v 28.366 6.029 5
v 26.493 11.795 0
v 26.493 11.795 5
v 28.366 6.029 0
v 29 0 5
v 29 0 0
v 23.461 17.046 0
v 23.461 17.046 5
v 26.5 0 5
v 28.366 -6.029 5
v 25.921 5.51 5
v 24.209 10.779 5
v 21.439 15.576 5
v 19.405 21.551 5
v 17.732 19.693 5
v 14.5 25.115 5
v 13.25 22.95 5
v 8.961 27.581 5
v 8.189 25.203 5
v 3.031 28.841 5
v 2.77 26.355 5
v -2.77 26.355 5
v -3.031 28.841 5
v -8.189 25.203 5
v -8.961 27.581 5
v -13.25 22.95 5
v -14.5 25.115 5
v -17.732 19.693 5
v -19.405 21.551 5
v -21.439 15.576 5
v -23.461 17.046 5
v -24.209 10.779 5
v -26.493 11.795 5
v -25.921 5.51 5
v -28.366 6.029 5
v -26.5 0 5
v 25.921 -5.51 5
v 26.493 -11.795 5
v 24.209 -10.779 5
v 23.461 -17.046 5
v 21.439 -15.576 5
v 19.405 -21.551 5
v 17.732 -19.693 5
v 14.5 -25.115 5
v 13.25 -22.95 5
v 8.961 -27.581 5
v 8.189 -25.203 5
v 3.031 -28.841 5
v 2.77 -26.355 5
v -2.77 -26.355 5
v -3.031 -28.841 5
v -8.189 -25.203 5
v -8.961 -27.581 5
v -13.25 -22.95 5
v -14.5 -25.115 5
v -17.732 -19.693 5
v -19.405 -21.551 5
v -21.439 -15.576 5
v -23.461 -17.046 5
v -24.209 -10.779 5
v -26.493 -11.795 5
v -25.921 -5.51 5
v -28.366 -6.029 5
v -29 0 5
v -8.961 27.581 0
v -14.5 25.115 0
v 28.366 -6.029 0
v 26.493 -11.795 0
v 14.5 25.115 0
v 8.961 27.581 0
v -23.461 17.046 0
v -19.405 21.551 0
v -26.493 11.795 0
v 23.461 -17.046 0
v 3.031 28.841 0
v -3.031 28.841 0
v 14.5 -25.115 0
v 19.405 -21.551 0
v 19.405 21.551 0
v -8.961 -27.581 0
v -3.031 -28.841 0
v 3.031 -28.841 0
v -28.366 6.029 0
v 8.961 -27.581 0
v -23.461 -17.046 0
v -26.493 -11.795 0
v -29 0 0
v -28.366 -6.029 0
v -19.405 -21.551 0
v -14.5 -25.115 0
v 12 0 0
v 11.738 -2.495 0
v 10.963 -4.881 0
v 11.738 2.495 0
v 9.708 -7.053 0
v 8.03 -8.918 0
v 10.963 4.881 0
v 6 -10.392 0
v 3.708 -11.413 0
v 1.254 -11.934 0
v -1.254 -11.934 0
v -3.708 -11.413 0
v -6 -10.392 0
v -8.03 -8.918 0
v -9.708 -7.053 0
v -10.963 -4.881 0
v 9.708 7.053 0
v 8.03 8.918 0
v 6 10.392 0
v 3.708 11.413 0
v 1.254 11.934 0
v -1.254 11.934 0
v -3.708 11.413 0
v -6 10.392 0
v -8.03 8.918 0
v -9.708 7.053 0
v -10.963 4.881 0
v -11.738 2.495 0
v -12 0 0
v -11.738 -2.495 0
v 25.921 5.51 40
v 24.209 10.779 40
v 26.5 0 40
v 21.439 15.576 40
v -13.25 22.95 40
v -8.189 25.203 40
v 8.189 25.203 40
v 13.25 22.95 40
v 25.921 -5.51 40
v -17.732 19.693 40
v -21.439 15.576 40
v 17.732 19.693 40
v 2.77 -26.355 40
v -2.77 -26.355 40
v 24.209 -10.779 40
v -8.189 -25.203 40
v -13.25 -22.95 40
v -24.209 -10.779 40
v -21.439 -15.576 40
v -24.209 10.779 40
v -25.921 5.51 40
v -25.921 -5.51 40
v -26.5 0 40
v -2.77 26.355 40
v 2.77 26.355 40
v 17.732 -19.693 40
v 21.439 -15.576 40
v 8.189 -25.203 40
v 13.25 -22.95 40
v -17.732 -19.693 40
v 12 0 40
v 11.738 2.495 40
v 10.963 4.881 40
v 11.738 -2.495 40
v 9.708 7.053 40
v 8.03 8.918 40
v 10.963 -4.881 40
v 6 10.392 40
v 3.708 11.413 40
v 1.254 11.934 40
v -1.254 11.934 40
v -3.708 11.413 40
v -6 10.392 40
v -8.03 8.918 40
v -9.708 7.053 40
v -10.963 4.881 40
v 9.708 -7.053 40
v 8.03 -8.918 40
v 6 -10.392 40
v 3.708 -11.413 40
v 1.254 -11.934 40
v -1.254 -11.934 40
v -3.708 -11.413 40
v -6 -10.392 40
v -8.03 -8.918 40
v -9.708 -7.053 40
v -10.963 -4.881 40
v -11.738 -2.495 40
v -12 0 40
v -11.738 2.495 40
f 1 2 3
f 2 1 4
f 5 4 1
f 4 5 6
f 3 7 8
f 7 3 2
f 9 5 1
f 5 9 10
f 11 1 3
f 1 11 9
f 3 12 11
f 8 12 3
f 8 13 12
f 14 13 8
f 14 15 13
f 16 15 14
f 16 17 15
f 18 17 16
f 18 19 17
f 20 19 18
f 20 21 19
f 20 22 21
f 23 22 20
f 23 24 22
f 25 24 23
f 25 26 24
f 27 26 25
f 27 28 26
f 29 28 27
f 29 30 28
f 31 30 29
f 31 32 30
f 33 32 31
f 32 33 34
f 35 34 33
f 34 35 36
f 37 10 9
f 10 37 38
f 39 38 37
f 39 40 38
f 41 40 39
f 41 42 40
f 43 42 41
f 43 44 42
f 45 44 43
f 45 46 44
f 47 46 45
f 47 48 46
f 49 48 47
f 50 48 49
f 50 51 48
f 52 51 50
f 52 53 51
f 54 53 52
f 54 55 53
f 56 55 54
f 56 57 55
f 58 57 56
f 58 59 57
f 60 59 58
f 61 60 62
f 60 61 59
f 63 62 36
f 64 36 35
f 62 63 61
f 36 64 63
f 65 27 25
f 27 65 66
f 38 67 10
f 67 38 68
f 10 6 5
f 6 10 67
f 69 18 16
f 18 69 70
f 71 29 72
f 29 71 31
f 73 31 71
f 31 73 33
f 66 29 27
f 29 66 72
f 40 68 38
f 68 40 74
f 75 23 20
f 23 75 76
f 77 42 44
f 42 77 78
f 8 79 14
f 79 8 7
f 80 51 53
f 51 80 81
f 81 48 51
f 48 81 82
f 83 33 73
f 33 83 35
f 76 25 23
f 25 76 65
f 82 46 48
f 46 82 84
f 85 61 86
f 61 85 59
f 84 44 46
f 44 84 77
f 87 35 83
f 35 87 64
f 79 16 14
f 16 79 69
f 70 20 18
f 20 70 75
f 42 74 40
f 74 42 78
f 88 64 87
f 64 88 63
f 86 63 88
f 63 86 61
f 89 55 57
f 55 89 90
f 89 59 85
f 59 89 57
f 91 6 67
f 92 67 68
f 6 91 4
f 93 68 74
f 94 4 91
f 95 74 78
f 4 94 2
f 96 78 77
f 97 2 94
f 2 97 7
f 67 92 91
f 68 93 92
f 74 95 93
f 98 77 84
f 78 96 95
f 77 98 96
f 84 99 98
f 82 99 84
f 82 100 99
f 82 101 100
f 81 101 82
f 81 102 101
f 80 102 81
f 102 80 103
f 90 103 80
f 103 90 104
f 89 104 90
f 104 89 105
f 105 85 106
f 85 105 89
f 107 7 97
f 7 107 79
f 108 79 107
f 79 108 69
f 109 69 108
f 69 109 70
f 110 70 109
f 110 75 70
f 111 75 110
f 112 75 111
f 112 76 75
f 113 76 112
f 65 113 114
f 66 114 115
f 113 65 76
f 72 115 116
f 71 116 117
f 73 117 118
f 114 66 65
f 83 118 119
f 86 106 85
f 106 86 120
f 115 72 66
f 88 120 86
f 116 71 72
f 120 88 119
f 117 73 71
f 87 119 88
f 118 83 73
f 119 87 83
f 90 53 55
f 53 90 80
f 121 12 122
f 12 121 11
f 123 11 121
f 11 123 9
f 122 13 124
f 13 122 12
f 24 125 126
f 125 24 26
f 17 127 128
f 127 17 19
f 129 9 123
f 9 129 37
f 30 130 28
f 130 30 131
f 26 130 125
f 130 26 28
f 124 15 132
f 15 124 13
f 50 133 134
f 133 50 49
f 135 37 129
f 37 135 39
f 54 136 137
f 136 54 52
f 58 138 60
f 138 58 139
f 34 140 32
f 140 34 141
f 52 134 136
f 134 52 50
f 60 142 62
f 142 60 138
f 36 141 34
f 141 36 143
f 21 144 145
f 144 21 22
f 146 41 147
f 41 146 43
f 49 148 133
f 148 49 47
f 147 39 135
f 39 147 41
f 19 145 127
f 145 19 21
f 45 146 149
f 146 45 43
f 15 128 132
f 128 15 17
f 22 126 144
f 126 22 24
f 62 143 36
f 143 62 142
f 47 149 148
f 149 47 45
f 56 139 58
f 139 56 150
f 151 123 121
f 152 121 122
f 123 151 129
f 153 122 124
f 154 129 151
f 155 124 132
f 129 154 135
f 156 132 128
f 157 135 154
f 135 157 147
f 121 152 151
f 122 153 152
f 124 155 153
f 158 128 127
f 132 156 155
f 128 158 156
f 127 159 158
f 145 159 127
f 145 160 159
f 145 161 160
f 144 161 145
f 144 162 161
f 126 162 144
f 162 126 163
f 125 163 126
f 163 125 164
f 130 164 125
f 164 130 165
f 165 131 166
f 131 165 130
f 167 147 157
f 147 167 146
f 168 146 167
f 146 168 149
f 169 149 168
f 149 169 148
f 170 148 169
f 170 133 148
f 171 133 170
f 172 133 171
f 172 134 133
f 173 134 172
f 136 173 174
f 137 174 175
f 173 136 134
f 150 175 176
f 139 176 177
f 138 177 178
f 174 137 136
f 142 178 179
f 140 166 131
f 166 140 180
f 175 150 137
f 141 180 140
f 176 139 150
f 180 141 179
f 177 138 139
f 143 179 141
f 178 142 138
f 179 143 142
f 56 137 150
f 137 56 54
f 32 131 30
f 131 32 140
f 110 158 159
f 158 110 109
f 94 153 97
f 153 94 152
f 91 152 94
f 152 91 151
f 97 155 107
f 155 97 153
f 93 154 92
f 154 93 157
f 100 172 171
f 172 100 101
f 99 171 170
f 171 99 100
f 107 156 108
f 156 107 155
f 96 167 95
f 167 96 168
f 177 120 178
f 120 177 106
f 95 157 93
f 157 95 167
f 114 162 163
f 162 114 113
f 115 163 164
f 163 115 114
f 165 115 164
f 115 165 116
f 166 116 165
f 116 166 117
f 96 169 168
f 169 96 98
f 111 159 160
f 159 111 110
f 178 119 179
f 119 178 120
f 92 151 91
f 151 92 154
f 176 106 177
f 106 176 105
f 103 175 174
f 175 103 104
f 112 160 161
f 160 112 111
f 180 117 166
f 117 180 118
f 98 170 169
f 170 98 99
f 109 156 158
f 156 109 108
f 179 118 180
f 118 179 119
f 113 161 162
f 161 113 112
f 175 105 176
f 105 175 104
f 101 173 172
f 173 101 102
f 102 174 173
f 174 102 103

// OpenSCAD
InnerDiameter = 24;
OuterDiameter = 53;
LipHeight = 5;
LipDiameter = OuterDiameter + 5;
Height = 35;

difference() {
  union() {
    cylinder(LipHeight, LipDiameter / 2, LipDiameter / 2);
    cylinder(Height + LipHeight, OuterDiameter / 2, OuterDiameter / 2);
  }
  cylinder(Height + LipHeight, InnerDiameter / 2, InnerDiameter / 2);
}
